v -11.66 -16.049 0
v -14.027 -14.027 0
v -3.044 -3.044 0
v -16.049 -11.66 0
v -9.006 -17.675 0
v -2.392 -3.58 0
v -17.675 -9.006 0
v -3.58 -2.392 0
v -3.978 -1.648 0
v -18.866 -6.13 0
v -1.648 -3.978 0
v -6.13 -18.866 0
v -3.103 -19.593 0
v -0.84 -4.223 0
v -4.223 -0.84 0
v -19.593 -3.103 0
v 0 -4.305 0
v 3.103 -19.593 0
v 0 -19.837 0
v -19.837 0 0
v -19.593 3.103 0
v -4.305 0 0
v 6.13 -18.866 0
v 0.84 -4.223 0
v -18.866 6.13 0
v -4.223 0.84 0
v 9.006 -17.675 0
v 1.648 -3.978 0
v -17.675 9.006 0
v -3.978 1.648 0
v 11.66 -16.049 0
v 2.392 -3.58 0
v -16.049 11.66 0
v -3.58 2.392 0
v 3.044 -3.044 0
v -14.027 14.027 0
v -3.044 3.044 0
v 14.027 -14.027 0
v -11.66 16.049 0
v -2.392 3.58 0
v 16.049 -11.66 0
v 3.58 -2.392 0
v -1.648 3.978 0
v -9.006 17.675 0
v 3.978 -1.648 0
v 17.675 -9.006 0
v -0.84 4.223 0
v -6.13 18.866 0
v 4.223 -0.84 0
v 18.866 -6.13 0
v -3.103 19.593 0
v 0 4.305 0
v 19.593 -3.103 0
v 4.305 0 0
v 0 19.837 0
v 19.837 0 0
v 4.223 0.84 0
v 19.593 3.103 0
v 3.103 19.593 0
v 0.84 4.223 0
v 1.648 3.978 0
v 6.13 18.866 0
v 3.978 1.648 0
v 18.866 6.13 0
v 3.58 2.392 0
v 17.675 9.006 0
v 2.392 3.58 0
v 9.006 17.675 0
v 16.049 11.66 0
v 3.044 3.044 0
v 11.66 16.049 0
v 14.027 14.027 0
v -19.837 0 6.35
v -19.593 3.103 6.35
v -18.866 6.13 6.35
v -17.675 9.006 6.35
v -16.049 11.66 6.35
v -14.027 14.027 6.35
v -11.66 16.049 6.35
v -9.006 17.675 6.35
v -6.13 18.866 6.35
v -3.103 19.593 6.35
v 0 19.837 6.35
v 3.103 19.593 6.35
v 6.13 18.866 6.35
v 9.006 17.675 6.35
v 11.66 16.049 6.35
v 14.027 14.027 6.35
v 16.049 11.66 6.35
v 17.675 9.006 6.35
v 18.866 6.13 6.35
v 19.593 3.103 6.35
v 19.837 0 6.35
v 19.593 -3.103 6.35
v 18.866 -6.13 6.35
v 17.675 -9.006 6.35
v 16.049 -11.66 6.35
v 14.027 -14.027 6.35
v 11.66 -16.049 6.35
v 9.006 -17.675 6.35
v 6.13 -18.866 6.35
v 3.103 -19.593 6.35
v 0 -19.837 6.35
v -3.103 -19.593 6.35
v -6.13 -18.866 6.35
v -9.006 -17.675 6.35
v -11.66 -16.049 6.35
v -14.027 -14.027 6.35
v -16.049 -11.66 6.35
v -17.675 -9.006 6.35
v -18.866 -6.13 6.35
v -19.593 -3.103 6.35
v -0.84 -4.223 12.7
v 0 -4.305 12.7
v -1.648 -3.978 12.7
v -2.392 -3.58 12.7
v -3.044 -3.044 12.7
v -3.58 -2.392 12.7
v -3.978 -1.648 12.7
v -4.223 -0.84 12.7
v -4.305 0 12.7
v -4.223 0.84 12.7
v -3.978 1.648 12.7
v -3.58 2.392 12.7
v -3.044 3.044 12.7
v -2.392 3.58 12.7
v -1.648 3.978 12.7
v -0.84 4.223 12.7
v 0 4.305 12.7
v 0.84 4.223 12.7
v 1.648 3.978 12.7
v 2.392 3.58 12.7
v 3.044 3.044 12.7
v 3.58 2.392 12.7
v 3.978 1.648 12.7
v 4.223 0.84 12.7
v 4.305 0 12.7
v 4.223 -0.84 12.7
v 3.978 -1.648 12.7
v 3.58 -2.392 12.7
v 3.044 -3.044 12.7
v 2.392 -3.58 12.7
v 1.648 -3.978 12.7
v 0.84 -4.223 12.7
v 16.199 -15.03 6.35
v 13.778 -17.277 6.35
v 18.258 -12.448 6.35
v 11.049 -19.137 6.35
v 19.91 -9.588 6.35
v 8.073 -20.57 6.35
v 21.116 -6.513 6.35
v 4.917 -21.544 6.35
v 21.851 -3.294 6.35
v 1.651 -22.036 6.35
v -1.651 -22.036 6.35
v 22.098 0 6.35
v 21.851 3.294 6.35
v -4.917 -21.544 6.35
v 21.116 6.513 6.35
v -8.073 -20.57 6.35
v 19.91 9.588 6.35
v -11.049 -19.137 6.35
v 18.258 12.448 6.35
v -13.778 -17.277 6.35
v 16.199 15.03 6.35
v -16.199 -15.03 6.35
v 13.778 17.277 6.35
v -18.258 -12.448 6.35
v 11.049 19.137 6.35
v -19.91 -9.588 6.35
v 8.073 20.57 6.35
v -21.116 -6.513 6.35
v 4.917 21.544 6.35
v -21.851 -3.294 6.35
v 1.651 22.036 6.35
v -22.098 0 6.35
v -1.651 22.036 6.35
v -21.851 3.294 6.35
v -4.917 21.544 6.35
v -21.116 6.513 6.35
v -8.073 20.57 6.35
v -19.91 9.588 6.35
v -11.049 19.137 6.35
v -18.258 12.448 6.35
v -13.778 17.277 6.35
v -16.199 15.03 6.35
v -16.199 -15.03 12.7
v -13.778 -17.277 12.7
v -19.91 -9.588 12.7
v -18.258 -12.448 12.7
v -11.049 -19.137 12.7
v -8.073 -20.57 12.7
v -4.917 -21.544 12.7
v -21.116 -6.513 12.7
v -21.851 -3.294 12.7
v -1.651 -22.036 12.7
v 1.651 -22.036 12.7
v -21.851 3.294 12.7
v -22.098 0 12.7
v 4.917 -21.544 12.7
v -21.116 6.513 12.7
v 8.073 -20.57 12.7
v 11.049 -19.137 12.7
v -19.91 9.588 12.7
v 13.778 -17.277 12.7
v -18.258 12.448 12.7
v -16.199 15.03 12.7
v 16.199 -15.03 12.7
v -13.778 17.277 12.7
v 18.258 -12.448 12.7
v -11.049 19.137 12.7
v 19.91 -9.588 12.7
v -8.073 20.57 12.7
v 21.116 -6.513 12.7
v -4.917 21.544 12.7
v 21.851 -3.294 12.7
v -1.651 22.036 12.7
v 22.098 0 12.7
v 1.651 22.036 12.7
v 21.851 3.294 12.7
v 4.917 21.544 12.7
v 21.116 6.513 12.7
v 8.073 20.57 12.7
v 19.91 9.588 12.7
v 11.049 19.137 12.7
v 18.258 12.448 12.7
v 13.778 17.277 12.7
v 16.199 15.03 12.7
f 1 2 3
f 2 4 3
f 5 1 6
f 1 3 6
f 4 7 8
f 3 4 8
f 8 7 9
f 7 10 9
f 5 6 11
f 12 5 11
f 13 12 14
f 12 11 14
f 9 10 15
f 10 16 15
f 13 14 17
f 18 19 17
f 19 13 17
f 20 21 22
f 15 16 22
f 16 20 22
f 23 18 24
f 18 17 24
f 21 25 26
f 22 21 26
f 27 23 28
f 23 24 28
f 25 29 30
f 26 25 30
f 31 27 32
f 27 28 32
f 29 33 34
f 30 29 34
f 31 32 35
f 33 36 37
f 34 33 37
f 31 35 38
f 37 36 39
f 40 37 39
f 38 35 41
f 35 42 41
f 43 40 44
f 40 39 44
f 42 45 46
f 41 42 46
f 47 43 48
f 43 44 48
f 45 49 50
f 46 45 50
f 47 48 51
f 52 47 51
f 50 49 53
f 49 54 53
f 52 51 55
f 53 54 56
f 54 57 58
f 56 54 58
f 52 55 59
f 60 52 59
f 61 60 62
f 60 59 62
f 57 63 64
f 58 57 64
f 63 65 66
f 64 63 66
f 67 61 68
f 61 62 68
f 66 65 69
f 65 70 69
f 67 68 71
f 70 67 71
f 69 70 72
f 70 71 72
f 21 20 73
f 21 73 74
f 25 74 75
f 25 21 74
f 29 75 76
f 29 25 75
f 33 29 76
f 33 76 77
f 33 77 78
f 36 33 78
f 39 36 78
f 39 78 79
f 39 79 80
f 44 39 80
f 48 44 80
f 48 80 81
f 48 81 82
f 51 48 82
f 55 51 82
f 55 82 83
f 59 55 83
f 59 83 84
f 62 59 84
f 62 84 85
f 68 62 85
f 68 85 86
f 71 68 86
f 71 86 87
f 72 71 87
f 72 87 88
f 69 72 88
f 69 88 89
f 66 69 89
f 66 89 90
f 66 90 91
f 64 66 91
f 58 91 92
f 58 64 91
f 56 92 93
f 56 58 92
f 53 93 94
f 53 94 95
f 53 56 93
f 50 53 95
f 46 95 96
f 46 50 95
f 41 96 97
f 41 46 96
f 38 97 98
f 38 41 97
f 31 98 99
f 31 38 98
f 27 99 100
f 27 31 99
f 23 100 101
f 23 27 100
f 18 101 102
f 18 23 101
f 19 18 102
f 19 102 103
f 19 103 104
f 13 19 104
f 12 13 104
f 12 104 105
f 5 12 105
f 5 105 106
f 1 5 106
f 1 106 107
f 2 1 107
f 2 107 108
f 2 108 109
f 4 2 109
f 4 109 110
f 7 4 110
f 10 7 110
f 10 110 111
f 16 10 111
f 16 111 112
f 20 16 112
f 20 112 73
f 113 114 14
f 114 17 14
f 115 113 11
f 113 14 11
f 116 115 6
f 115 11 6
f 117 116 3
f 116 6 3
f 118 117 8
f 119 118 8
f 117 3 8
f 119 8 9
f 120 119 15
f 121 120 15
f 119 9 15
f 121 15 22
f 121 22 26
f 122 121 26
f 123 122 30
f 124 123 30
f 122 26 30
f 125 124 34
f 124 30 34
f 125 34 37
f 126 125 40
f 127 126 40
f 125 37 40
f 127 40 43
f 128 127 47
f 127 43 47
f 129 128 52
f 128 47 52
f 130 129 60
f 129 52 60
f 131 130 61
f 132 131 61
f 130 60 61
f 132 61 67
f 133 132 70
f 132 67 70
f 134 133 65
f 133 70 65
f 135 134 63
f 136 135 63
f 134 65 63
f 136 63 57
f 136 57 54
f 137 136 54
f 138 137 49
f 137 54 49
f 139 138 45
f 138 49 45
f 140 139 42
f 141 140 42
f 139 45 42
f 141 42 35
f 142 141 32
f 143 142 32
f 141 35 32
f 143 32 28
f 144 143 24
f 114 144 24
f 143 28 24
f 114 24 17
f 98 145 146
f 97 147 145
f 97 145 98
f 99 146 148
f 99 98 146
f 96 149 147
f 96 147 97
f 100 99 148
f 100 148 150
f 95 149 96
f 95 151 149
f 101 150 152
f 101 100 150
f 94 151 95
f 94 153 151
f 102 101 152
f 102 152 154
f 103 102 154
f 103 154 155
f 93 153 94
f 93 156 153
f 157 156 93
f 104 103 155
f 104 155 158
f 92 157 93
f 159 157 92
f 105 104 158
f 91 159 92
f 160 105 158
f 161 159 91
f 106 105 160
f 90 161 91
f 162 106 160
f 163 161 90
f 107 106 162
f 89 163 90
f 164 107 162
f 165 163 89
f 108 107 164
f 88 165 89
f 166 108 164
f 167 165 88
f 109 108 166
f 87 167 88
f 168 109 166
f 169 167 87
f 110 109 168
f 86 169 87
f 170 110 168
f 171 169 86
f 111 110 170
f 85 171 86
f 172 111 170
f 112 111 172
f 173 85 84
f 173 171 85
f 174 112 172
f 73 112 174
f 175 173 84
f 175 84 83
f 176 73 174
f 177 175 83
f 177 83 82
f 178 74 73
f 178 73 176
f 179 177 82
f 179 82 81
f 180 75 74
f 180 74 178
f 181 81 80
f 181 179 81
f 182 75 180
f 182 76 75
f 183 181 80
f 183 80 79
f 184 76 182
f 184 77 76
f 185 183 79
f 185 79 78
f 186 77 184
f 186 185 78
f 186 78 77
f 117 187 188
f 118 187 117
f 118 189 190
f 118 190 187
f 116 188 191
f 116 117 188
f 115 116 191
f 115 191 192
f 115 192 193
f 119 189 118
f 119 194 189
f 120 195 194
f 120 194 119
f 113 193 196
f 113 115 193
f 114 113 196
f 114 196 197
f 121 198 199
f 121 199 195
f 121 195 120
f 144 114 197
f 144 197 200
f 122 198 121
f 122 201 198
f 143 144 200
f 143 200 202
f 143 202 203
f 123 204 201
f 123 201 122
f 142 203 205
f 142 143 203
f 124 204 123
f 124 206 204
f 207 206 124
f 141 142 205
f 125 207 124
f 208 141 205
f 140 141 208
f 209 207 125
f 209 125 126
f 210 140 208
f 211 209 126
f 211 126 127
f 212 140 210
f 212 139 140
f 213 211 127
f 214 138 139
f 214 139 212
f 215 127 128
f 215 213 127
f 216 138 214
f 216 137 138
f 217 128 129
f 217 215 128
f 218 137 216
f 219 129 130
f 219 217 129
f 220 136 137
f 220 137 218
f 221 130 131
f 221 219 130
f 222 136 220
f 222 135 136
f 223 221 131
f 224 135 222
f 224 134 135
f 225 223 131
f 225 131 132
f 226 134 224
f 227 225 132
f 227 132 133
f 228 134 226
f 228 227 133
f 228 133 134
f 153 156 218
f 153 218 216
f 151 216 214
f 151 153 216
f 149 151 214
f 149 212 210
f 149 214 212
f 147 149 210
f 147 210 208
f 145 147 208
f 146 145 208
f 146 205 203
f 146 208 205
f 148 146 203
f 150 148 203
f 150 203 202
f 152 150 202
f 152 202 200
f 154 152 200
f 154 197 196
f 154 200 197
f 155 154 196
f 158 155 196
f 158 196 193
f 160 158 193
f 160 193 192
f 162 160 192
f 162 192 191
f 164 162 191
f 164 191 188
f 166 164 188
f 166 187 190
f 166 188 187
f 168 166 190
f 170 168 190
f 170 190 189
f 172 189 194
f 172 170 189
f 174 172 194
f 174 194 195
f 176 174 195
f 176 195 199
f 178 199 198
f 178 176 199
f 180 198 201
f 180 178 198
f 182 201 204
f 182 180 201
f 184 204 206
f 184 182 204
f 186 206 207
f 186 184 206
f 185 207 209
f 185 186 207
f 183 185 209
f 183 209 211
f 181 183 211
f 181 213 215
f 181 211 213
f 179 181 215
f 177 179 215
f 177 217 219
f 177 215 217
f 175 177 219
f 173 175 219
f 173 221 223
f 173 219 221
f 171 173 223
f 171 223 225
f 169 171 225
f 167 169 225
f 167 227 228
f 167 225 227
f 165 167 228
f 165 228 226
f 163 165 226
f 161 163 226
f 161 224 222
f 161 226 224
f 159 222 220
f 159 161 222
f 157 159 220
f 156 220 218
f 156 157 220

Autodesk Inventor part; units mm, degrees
ref_plane "YZ Plane" through (0, 0, 0) normal (1, 0, 0) x (0, 1, 0)
ref_plane "XZ Plane" through (0, 0, 0) normal (0, 1, 0) x (-1, 0, 0)
ref_plane "XY Plane" through (0, 0, 0) normal (0, 0, 1) x (1, 0, 0)
sketch "Sketch1" plane through (0, 0, 0) normal (0, 0, 1) x (1, 0, 0)
  circle A0 centre (0, 0) radius 22.098
  dimension "d11" = 44.196
extrude "Extrusion1" add sketch "Sketch1" along normal blind 12.7
sketch "Sketch2" plane through (0, 0, 12.7) normal (0, 0, 1) x (1, 0, 0)
  circle A0 centre (0, 0) radius 22.098 projected
hole "Hole1" at (0, 0, 12.7) direction (0, 0, -1) diameter 8.6106 depth 25.4 tip angle 118 thread size "1/8" designation "1/8 - 27 NPT" standard "NPT for PVC Pipe and Fitting"
sketch "Sketch3" plane through (0, 0, 0) normal (0, 0, -1) x (-1, 0, 0)
  circle A0 centre (0, 0) radius 4.3053 projected
  circle A1 centre (0, 0) radius 22.098 projected
sketch "Sketch4" plane through (0, 0, 0) normal (0, 0, -1) x (-1, 0, 0)
  circle A0 centre (0, 0) radius 22.098 projected
  circle A1 centre (0, 0) radius 19.8374
  dimension "d12" = 39.6748
extrude "Extrusion2" cut sketch "Sketch4" against normal blind 6.35
thread "Thread1" size "1 9/16-20 UN" class "2A" standard "ANSI Unified Screw Threads" length 6.35
properties part number "JF-AT-TC0007" material "Acetal Resin, Black"
